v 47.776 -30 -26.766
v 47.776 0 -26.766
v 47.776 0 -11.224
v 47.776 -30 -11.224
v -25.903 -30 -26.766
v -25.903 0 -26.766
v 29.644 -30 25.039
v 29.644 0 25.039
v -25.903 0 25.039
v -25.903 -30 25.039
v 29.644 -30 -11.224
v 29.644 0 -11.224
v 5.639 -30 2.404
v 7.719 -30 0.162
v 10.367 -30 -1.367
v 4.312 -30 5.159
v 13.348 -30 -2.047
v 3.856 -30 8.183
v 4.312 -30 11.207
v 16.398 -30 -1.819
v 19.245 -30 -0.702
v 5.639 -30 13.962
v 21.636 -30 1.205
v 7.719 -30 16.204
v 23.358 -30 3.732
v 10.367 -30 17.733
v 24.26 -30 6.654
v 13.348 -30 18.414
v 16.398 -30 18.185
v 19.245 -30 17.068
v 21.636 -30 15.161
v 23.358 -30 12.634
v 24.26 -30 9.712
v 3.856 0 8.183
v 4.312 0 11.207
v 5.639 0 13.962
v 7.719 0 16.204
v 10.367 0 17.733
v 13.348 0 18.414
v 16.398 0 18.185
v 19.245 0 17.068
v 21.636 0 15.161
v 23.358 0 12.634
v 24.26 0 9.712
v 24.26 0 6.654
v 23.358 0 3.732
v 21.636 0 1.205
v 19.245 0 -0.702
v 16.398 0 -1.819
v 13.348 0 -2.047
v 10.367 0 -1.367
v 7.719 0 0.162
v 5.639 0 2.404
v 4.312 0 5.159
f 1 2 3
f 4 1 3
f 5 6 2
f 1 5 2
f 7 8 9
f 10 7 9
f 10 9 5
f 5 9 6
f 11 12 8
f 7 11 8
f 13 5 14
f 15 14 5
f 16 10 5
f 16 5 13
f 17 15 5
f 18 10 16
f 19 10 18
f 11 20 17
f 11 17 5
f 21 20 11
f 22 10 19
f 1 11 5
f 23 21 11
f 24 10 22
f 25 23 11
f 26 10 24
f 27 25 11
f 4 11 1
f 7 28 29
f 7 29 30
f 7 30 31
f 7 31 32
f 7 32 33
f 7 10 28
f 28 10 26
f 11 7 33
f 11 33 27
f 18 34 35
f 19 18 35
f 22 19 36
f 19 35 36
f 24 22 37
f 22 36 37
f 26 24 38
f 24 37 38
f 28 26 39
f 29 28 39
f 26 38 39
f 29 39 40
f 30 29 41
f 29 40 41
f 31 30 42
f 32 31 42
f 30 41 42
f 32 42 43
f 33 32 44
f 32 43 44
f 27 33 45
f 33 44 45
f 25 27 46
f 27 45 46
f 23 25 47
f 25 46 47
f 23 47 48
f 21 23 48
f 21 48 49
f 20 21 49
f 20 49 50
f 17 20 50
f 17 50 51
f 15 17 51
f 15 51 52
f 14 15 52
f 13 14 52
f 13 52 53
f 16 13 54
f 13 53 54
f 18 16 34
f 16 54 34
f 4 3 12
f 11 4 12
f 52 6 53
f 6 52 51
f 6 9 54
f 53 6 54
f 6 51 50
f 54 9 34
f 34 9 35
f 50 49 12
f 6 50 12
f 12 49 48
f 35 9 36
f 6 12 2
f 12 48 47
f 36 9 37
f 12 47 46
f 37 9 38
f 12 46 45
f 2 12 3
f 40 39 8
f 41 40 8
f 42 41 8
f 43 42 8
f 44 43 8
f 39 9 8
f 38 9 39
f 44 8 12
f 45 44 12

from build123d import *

# Parameters (mm, degrees)
F1_DEPTH = 30
F2_R     = 10.259212
F3_DEPTH = 30


with BuildPart() as f1:
    # F0 (on Front) → F1 (new body)
    with BuildSketch(Plane.XZ):
        Polygon((29.64399, 25.039099), (-25.902519, 25.039099), (-25.902519, -26.765937), (29.64399, -26.765937), (47.775757, -26.765937), (47.775757, -11.224424), (29.64399, -11.224424), align=None)
    extrude(amount=F1_DEPTH)

    # F2 (on face) → F3 (cut)
    with BuildSketch(Plane(origin=(0, 0, 0), x_dir=(-1, 0, 0), z_dir=(0, 1, 0))):
        with Locations((-14.11511, 8.183153)):
            Circle(F2_R)
    extrude(amount=-F3_DEPTH, mode=Mode.SUBTRACT)


solid = f1.part
